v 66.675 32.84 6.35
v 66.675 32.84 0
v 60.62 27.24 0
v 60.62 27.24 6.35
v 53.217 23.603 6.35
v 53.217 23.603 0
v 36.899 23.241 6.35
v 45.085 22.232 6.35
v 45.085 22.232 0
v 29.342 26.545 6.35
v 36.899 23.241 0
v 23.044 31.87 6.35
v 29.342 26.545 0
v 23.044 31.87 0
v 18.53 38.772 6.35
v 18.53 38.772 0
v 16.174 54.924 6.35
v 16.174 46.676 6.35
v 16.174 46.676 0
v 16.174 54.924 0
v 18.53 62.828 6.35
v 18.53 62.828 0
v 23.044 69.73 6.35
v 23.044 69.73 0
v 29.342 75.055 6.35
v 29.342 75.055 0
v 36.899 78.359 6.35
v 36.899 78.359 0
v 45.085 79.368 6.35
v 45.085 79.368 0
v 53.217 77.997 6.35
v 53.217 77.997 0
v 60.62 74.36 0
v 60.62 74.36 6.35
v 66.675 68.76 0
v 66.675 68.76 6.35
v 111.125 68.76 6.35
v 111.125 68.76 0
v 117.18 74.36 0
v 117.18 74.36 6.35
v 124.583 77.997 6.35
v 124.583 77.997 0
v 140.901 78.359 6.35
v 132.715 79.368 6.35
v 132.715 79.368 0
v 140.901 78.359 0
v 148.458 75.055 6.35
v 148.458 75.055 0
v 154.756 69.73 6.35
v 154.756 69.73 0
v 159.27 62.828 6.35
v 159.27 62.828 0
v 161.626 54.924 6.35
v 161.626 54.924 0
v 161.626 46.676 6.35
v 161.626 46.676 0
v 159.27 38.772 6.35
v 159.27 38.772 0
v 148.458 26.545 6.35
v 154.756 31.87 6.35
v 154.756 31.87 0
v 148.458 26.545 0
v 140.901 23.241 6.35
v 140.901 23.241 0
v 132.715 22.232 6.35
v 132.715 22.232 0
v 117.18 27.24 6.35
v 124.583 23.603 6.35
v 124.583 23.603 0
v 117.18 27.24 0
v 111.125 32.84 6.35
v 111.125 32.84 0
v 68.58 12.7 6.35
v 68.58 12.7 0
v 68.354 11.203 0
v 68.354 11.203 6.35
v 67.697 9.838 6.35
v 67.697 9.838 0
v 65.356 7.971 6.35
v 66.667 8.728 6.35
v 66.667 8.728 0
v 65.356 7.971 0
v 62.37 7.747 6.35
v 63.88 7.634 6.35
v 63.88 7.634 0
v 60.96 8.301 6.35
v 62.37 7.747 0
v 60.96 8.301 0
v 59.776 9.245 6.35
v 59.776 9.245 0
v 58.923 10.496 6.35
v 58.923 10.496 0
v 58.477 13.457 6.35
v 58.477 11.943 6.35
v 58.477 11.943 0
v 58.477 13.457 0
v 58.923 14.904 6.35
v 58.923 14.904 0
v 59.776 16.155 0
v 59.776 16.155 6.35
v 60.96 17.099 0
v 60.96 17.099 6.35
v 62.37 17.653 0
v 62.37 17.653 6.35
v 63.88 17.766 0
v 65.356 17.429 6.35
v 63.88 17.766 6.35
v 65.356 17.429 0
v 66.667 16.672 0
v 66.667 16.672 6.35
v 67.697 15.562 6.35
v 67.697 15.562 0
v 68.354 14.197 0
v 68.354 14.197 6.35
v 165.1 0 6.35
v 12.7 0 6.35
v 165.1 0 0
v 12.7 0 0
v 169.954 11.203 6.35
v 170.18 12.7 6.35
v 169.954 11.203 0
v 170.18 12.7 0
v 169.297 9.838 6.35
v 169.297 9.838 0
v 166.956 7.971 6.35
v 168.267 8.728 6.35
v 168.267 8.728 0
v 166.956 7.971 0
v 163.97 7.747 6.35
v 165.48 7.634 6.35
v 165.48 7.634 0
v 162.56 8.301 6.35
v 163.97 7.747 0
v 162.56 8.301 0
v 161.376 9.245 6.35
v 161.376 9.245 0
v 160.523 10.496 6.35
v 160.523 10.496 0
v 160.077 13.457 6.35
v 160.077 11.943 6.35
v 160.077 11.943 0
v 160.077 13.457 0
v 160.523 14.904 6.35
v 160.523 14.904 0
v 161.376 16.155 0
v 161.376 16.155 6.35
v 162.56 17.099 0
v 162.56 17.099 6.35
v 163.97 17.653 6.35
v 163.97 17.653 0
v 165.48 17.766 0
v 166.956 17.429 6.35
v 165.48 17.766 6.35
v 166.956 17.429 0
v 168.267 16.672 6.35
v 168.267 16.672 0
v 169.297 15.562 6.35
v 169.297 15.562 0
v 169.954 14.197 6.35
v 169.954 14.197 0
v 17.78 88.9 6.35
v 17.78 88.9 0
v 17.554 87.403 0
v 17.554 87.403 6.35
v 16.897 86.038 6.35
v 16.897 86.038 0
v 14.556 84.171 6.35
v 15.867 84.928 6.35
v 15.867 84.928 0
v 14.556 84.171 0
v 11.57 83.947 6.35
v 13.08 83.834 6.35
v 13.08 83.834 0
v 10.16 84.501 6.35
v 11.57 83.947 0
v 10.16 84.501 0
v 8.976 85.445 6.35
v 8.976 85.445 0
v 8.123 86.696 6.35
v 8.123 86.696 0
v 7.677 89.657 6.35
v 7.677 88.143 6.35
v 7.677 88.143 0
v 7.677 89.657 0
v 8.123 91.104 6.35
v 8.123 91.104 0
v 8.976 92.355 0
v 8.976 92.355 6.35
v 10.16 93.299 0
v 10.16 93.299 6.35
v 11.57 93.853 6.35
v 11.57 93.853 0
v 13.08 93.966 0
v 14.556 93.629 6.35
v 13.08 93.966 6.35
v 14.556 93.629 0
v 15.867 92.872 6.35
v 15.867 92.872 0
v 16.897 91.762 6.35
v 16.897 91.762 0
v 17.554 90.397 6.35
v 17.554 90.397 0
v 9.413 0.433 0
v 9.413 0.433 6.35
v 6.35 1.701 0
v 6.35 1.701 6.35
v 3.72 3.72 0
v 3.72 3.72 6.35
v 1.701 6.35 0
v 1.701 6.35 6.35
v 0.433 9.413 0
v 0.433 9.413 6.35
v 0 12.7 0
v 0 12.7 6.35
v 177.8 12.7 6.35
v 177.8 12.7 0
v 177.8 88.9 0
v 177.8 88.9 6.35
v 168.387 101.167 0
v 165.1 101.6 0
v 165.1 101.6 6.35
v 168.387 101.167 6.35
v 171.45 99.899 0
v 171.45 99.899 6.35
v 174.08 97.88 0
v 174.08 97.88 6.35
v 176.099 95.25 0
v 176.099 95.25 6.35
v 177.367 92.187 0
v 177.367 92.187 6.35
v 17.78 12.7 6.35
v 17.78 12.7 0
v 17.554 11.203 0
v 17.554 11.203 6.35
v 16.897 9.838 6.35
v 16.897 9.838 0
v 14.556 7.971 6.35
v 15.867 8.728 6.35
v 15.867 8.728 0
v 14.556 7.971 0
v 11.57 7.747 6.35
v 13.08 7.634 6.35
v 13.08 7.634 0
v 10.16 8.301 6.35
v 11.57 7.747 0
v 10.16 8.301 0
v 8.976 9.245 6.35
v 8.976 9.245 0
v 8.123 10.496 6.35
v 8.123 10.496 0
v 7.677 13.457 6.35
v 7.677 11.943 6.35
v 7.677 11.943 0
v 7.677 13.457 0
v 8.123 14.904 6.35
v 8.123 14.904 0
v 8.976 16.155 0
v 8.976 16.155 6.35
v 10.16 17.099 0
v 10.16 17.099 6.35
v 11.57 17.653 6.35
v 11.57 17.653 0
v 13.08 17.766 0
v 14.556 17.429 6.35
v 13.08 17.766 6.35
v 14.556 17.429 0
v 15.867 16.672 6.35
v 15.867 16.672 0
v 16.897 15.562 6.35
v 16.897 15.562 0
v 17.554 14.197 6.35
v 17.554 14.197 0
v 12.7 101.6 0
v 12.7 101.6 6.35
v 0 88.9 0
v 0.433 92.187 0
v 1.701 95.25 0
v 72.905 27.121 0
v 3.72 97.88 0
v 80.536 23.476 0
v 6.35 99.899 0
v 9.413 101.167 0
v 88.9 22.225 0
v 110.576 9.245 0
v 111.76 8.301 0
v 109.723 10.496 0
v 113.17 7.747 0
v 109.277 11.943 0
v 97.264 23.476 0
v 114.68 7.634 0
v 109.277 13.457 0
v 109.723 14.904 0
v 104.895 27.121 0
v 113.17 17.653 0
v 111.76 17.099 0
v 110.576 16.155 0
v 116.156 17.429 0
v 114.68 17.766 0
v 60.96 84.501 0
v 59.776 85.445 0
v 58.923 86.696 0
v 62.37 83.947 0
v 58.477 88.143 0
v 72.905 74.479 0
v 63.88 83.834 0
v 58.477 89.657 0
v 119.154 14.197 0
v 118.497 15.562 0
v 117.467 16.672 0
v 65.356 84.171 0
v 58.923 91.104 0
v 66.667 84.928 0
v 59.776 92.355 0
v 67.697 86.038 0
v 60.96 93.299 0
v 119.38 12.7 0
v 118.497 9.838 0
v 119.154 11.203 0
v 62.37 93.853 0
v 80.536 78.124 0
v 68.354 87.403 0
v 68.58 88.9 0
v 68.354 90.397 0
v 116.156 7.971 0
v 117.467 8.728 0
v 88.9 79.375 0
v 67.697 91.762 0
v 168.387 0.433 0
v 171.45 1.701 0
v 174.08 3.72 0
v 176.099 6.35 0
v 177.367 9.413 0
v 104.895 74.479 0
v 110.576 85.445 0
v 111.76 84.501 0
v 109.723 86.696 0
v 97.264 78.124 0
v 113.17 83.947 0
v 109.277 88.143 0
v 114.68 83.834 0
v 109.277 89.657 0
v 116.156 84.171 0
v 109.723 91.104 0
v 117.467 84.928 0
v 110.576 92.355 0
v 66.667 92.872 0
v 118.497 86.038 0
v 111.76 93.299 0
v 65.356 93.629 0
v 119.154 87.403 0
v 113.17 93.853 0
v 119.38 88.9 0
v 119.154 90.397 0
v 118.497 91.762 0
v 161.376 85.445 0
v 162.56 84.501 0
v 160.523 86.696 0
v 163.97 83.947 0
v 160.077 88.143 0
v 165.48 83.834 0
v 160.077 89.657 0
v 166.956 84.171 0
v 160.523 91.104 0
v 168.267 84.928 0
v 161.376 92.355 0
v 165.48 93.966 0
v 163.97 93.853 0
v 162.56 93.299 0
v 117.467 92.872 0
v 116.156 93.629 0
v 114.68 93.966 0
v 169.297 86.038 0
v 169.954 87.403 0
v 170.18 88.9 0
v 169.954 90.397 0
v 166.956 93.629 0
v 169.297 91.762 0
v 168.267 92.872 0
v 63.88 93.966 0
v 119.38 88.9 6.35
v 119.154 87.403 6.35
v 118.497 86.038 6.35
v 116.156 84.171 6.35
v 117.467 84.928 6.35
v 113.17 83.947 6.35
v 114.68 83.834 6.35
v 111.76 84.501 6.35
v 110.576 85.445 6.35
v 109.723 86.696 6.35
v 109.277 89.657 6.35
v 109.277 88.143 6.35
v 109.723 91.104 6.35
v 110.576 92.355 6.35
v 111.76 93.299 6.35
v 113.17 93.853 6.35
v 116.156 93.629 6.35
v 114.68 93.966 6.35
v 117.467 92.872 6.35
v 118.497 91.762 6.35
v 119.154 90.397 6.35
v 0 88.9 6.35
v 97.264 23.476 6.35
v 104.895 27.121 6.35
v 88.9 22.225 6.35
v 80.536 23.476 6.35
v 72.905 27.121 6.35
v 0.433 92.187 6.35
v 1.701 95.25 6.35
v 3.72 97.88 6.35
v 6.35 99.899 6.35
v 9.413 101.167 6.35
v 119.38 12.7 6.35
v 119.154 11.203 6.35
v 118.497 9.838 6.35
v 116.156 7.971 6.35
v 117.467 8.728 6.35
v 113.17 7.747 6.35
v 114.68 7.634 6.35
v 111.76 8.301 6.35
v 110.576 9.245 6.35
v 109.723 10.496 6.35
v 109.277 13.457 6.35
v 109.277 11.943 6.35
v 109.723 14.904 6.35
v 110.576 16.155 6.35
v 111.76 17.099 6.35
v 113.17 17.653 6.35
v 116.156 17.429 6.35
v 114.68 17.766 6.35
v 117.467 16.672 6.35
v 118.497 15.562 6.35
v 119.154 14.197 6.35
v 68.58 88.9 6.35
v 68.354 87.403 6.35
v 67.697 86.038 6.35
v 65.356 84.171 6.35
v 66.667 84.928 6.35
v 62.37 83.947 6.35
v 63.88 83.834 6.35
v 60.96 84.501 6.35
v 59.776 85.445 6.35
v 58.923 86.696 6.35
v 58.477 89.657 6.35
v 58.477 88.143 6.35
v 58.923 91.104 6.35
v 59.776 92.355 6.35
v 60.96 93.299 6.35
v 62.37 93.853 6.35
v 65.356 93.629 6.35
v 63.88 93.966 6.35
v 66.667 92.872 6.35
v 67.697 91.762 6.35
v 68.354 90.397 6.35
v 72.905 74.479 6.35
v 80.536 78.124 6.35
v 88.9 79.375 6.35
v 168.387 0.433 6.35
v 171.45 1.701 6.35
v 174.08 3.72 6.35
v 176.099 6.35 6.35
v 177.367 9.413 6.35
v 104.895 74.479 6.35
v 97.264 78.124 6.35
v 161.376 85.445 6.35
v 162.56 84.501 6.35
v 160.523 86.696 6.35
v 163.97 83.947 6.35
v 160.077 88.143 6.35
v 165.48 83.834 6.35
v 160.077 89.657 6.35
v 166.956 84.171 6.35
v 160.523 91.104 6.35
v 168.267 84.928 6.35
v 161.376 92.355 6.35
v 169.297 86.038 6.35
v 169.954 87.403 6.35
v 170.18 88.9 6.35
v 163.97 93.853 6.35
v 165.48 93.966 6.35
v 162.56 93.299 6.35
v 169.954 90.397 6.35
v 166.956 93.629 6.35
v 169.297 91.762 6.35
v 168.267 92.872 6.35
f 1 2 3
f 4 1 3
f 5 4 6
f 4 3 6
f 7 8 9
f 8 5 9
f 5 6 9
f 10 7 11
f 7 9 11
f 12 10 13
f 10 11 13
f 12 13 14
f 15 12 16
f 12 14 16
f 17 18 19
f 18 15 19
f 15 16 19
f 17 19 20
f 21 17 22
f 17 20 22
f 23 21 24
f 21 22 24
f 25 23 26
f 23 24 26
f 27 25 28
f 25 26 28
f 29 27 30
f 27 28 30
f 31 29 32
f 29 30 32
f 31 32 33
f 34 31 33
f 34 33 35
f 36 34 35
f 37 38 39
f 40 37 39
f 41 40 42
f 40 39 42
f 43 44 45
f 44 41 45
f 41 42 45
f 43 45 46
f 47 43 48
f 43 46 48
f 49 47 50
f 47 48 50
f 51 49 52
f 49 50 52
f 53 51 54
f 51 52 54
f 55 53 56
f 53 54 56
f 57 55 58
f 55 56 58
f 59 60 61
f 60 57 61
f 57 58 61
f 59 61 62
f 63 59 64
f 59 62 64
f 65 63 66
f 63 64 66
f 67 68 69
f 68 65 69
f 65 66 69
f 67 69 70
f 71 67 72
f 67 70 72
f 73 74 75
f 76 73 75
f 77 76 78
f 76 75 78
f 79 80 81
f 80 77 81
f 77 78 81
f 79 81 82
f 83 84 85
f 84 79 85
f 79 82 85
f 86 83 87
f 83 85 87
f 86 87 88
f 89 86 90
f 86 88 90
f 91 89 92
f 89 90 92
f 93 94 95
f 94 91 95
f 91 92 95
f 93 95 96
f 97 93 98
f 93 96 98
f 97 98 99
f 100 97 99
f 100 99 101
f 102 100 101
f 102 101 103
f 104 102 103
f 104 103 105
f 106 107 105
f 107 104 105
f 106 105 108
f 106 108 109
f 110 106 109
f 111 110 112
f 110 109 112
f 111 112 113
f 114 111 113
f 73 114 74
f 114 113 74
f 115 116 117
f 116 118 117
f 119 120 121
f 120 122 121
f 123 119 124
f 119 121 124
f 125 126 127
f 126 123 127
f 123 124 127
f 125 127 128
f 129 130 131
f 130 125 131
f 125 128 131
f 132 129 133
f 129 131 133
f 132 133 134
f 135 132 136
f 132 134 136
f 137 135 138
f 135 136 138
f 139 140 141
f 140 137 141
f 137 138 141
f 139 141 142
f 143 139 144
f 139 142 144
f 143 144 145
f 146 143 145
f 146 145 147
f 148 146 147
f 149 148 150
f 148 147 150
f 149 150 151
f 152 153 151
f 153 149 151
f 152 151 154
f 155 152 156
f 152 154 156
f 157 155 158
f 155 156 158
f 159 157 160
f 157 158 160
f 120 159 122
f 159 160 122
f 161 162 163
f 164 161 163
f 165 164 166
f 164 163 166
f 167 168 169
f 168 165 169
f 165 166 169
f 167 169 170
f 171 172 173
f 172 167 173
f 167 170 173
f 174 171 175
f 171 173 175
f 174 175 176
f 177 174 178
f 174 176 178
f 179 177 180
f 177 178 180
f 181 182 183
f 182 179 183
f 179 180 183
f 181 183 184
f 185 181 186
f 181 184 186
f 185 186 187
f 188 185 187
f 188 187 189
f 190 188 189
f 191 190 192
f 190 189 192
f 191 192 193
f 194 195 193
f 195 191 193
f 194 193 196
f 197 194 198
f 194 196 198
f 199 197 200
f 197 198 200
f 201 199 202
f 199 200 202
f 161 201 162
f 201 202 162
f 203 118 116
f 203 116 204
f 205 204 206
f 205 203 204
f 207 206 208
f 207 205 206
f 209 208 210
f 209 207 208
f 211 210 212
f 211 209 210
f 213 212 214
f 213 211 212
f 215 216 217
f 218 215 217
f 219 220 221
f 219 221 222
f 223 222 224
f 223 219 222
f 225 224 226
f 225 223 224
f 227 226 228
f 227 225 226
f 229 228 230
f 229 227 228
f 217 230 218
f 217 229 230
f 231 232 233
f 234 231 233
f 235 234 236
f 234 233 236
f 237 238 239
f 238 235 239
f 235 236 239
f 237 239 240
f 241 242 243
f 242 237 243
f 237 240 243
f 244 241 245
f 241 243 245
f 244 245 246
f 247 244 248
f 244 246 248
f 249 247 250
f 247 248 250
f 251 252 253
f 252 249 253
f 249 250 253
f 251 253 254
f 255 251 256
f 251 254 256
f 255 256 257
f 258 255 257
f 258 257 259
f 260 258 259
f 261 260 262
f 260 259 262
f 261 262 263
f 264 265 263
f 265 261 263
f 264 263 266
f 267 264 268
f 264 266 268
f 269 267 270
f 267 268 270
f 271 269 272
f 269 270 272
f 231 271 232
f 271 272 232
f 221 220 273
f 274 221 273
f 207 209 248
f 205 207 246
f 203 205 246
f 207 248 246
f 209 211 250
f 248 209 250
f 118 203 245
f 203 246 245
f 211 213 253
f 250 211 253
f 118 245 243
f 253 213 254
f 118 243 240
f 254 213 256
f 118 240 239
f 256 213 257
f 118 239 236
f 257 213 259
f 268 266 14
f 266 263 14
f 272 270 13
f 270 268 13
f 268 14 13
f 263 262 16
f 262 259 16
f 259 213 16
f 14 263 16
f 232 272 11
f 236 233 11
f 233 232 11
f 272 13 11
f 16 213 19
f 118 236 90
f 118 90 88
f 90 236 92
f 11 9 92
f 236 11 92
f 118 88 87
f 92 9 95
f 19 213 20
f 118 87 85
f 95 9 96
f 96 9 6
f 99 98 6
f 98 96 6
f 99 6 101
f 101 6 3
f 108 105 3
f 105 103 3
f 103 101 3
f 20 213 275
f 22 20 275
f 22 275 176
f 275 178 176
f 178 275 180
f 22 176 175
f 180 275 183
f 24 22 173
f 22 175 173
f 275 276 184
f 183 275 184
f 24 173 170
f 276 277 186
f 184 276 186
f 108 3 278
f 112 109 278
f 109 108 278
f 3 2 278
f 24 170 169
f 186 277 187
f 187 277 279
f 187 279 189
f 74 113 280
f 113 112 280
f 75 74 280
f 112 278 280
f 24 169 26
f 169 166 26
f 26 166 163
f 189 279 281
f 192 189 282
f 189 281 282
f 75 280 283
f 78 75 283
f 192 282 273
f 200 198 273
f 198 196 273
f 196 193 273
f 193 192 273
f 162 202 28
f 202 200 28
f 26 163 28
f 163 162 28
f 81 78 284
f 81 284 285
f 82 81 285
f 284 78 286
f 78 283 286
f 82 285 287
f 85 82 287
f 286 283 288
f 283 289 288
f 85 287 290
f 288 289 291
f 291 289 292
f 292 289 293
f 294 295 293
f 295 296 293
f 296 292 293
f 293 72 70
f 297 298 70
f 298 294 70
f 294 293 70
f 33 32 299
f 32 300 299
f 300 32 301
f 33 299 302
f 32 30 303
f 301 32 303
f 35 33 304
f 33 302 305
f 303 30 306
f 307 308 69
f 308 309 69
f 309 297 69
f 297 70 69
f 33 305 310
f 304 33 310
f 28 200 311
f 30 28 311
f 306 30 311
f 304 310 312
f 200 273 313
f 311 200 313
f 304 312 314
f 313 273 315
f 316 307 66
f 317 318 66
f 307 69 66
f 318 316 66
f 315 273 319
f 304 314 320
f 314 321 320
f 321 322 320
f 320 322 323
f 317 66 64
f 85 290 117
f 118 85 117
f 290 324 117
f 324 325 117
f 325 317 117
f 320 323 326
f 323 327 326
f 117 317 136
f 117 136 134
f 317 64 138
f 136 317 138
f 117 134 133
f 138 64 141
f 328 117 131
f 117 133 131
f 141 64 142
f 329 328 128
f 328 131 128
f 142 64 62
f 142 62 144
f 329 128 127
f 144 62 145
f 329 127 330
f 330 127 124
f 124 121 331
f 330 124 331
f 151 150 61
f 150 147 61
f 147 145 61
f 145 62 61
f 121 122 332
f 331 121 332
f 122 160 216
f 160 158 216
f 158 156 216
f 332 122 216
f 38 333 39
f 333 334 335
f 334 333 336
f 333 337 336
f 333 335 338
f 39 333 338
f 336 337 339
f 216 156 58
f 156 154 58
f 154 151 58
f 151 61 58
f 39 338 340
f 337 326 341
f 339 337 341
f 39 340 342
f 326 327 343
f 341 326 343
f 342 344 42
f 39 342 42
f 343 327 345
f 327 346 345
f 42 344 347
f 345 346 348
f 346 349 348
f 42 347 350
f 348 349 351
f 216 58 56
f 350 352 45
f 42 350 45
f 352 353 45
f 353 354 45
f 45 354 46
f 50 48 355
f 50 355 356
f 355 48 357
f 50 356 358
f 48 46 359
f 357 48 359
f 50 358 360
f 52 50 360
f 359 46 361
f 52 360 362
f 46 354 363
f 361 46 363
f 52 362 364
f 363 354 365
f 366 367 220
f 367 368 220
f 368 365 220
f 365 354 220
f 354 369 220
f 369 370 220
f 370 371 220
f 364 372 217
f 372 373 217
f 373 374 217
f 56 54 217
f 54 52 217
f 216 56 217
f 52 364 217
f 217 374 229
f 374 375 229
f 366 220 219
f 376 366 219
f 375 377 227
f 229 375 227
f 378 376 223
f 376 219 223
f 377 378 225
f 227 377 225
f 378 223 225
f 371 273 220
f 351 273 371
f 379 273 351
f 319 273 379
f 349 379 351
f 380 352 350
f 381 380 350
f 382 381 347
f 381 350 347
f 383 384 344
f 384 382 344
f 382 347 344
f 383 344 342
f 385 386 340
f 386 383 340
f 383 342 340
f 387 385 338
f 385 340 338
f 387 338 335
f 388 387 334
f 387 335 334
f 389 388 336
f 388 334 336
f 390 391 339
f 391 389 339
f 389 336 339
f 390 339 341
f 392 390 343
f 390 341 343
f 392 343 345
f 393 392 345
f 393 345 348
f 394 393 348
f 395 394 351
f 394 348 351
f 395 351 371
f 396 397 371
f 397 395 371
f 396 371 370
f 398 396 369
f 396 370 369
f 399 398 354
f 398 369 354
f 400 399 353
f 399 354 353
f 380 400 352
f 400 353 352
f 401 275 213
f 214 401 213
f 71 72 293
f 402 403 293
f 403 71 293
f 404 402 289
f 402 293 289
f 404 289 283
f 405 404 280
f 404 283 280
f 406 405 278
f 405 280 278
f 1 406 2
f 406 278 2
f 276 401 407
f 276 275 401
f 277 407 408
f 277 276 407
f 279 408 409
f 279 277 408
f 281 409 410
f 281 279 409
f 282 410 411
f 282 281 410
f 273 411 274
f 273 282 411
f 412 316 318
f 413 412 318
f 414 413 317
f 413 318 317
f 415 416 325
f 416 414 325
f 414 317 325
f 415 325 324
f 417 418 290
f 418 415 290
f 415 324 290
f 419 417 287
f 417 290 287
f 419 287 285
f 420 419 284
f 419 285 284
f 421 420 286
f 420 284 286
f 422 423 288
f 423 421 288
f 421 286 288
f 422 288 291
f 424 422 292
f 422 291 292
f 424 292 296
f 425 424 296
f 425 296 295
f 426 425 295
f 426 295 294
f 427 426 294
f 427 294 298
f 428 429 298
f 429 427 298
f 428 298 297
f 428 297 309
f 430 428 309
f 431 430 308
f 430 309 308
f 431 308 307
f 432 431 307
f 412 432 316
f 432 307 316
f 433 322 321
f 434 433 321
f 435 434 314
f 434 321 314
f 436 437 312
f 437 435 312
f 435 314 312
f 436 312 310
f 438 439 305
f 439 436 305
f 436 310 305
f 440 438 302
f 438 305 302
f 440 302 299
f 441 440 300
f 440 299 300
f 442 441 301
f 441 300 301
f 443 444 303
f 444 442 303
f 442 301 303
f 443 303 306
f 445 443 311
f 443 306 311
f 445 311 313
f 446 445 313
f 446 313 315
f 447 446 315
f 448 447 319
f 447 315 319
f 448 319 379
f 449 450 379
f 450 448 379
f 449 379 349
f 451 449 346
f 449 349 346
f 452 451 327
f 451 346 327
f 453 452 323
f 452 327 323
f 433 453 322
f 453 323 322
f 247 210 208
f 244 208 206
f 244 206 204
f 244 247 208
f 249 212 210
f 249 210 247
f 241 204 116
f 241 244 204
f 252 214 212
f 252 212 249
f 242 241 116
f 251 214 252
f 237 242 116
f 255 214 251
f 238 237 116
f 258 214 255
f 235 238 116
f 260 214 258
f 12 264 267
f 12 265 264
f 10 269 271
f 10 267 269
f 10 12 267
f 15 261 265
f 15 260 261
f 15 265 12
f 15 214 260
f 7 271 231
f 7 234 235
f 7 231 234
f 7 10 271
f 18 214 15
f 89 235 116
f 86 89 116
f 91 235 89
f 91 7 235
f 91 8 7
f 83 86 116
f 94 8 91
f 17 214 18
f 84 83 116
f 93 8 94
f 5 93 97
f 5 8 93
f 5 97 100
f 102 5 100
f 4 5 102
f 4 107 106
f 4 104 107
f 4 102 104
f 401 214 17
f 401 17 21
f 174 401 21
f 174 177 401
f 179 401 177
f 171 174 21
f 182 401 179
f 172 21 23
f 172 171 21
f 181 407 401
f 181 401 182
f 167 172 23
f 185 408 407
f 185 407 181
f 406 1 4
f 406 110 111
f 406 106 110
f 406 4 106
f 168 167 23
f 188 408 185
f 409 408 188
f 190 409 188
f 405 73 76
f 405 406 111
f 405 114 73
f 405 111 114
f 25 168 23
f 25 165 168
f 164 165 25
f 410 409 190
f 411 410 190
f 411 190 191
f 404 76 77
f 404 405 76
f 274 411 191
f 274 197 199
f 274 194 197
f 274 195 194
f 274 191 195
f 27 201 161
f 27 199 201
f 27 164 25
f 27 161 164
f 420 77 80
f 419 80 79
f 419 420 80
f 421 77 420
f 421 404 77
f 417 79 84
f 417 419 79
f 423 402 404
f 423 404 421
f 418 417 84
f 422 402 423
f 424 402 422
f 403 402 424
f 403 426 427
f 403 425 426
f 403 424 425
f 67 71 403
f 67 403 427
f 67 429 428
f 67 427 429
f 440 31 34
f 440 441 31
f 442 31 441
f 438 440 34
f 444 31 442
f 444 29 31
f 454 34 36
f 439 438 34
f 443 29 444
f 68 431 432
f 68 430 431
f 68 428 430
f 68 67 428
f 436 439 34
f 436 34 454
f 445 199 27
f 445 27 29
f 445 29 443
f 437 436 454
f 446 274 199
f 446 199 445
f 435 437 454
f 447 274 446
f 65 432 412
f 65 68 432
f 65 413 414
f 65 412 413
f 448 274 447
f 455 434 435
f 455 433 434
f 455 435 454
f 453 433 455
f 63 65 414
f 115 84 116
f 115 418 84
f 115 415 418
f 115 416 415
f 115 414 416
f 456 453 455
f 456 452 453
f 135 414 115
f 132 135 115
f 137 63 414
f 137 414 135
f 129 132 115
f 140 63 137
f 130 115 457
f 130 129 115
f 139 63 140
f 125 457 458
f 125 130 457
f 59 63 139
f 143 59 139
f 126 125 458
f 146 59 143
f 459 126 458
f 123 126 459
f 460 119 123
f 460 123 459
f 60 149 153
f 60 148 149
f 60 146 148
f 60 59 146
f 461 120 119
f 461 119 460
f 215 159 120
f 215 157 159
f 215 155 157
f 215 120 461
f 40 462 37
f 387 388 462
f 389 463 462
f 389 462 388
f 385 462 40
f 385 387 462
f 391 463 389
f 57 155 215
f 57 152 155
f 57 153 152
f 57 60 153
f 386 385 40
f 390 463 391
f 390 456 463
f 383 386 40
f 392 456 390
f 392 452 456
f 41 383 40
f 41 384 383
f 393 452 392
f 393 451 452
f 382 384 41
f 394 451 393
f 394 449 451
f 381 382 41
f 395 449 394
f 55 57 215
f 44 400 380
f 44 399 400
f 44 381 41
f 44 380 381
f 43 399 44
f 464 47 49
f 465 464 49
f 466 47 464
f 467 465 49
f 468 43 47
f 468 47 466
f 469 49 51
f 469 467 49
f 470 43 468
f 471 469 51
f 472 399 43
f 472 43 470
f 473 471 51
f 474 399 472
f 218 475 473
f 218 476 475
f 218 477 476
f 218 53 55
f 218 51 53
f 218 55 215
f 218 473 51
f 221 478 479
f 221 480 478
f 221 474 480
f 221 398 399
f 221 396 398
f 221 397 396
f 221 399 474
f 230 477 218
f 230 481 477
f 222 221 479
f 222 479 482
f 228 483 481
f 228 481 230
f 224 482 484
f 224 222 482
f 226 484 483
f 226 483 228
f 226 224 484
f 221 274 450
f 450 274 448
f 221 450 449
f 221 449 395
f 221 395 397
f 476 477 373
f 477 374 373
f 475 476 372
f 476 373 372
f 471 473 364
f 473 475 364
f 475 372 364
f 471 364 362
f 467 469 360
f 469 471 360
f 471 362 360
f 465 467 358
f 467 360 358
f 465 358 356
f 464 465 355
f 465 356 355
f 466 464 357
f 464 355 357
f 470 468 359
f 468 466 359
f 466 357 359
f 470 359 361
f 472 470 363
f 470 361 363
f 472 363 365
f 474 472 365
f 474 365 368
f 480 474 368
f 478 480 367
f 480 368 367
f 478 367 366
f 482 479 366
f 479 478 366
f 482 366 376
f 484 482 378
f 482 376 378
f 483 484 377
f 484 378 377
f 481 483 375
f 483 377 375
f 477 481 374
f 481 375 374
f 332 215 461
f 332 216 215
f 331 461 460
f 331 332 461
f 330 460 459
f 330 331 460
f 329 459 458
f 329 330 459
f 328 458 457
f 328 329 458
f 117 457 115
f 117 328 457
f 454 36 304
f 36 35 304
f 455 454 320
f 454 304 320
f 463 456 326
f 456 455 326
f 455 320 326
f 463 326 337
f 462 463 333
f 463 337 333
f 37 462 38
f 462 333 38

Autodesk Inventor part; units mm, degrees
ref_plane "YZ Plane" through (0, 0, 0) normal (1, 0, 0) x (0, 1, 0)
ref_plane "XZ Plane" through (0, 0, 0) normal (0, 1, 0) x (-1, 0, 0)
ref_plane "XY Plane" through (0, 0, 0) normal (0, 0, 1) x (1, 0, 0)
sketch "Sketch1" plane through (0, 0, 0) normal (0, 0, 1) x (1, 0, 0)
  line L0 (12.7, 0) -> (165.1, 0)
  line L1 (177.8, 12.7) -> (177.8, 88.9)
  line L2 (165.1, 101.6) -> (12.7, 101.6)
  line L3 (0, 88.9) -> (0, 12.7)
  arc A0 (12.7, 101.6) -> (0, 88.9) centre (12.7, 88.9) ccw
  arc A1 (0, 12.7) -> (12.7, 0) centre (12.7, 12.7) ccw
  arc A2 (165.1, 0) -> (177.8, 12.7) centre (165.1, 12.7) ccw
  arc A3 (177.8, 88.9) -> (165.1, 101.6) centre (165.1, 88.9) ccw
  circle A4 centre (12.7, 88.9) radius 5.08
  circle A5 centre (165.1, 88.9) radius 5.08
  circle A6 centre (165.1, 12.7) radius 5.08
  circle A7 centre (12.7, 12.7) radius 5.08
  circle A8 centre (63.5, 88.9) radius 5.08
  circle A9 centre (114.3, 88.9) radius 5.08
  circle A10 centre (63.5, 12.7) radius 5.08
  circle A11 centre (114.3, 12.7) radius 5.08
  arc A12 (111.125, 32.8395) -> (111.125, 68.7605) centre (133.35, 50.8) ccw
  arc A13 (66.675, 68.7605) -> (66.675, 32.8395) centre (44.45, 50.8) ccw
  arc A14 (66.675, 32.8395) -> (111.125, 32.8395) centre (88.9, 50.8) ccw
  arc A15 (111.125, 68.7605) -> (66.675, 68.7605) centre (88.9, 50.8) ccw
  point P0 (0, 0)
  point P1 (177.8, 0)
  point P2 (0, 101.6)
  dimension "d0" = 101.6
  dimension "d1" = 177.8
  dimension "d2" = 12.7
  dimension "d3" = 10.16
  dimension "d4" = 10.16
  dimension "d15" = 50.8
  dimension "d17" = 50.8
  dimension "d18" = 88.9
  dimension "d19" = 57.15
  dimension "d20" = 44.45
  dimension "d21" = 57.15
  dimension "d22" = 44.45
extrude "Extrusion1" add sketch "Sketch1" along normal blind 6.35
properties part number "HW 8 Part 5"
